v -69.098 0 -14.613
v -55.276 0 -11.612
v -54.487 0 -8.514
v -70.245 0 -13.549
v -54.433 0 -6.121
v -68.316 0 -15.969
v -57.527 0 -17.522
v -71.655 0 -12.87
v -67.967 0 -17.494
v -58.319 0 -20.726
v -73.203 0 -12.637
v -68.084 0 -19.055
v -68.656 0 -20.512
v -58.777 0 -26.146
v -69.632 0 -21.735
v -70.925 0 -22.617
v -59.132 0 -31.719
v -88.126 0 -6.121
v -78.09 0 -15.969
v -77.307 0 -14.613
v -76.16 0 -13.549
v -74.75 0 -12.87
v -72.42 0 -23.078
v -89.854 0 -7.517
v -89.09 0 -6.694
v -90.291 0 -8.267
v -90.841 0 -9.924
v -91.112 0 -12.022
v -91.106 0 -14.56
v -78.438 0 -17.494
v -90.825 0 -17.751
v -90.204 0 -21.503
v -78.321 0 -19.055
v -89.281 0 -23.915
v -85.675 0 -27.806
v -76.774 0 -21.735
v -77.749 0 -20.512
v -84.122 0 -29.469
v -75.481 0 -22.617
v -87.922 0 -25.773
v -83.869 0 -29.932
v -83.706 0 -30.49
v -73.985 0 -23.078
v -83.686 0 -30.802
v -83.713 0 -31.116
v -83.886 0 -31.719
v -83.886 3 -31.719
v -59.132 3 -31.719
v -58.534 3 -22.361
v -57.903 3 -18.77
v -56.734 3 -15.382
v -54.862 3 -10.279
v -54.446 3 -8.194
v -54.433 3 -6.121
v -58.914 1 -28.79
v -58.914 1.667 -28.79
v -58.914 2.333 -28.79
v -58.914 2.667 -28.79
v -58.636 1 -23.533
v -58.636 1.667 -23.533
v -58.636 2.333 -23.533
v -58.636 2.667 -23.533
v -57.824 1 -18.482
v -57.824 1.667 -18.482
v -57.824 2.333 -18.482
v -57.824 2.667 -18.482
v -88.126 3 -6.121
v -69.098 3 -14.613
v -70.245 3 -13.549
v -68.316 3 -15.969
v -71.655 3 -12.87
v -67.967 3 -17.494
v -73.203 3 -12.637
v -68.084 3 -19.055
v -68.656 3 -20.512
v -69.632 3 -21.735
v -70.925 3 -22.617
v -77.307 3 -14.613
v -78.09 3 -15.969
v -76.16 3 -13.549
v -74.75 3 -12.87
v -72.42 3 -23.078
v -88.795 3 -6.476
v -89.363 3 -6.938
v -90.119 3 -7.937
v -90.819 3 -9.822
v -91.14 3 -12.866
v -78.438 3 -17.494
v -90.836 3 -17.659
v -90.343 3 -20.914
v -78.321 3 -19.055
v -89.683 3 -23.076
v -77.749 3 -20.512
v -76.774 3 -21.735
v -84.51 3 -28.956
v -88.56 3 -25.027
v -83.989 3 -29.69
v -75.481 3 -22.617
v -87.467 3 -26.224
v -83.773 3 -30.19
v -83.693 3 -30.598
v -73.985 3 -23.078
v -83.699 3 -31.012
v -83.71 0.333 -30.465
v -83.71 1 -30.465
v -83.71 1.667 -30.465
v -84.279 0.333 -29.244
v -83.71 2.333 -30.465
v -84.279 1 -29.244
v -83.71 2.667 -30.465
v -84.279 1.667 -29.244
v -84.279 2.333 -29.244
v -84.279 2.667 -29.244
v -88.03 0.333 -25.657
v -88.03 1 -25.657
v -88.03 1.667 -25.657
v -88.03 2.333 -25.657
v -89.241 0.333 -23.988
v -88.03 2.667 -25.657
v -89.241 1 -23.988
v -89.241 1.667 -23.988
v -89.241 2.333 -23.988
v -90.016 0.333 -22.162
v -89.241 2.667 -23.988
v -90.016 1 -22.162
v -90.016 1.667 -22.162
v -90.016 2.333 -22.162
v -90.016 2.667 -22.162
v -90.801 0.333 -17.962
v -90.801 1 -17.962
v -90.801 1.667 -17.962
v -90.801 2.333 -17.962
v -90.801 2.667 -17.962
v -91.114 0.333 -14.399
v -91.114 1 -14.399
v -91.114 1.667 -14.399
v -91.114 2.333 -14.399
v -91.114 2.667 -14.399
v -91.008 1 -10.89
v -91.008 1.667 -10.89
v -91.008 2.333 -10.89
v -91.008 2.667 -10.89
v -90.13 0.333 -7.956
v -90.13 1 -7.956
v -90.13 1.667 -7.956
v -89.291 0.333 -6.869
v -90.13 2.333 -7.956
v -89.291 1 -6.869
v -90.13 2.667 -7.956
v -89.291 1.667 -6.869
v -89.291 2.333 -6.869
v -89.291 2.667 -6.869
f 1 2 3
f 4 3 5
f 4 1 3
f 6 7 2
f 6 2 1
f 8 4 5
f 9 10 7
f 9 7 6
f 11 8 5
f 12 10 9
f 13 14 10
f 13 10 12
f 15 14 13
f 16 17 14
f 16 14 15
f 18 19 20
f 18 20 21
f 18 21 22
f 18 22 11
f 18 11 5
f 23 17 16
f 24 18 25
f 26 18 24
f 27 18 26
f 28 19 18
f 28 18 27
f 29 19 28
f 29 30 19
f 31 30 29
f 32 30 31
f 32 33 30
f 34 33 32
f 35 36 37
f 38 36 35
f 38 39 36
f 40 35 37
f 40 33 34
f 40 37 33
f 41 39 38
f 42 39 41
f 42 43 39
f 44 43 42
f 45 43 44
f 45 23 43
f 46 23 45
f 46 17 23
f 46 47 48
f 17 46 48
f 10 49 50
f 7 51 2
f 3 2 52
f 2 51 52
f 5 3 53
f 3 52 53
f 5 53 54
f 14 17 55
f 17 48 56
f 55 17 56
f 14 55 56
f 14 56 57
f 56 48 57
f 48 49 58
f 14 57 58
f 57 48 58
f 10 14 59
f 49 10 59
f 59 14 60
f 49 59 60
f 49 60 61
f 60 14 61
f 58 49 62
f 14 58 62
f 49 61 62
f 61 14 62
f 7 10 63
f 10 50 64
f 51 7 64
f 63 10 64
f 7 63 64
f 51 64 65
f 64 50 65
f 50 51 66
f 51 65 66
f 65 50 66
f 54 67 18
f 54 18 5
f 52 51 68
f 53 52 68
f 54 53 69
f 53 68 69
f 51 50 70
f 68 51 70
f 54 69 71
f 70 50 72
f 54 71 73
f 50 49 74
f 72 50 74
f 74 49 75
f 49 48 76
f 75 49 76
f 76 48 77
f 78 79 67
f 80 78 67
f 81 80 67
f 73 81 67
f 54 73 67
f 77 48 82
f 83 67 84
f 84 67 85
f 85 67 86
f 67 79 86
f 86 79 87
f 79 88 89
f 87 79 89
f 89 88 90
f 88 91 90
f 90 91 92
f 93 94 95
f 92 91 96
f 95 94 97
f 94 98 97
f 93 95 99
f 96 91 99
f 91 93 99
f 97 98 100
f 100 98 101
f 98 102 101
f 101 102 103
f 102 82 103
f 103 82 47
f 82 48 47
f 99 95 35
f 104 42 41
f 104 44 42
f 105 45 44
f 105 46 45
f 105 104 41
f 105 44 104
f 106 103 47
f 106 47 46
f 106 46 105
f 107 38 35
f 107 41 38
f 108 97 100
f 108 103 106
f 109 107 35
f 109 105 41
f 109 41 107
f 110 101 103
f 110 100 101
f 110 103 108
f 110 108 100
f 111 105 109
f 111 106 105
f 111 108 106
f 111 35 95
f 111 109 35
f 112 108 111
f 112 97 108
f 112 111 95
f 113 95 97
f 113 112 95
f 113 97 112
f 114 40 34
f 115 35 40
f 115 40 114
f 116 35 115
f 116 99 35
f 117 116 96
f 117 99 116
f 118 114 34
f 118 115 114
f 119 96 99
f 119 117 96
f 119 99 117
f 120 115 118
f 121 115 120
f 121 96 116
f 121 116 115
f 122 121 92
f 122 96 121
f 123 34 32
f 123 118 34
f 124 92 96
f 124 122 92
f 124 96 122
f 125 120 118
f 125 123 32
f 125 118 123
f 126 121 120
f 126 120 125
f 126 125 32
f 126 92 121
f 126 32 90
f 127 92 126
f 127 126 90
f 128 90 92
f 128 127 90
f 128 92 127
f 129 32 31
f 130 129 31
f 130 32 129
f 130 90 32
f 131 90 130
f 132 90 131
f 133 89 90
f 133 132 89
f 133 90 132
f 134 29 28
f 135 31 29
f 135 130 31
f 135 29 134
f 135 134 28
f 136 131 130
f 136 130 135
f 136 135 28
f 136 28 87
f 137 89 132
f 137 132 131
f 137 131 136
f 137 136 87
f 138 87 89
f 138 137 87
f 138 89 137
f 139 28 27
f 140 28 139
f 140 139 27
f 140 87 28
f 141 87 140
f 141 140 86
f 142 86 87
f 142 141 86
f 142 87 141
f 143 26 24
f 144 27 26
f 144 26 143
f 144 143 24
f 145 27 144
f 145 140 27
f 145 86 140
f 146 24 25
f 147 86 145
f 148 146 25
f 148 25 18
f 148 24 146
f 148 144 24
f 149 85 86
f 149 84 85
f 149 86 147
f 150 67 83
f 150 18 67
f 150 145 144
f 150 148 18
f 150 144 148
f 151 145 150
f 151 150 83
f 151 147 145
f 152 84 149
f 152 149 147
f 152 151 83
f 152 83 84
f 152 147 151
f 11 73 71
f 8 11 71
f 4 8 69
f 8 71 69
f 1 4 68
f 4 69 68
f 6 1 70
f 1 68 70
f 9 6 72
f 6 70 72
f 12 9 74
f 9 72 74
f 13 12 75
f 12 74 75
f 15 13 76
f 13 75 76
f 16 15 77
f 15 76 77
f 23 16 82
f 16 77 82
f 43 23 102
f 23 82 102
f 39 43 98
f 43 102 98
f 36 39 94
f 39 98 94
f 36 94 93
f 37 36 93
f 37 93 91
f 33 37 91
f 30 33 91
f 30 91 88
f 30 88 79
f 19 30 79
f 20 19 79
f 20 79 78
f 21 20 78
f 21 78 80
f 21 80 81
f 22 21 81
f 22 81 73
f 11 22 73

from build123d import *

# Parameters (mm, degrees)
DODANIE_WYCI_GNI_CIE1_DEPTH = 3
SZKIC2_R                    = 5.25
WYTNIJ_WYCI_GNI_CIE1_DEPTH  = 123.478678077
SZKIC3_W                    = 83.042343976
SZKIC3_H                    = 22.425434336
SZKIC3_W_2                  = 92.40199983
SZKIC3_H_2                  = 23.262955651
WYTNIJ_WYCI_GNI_CIE2_DEPTH  = 123.478678077
WYTNIJ_WYCI_GNI_CIE3_DEPTH  = 114.371150202


with BuildPart() as part:
    # Szkic1 → Dodanie-wyciągnięcie1 (new body)
    with BuildSketch(Plane(origin=(0, 0, 0), x_dir=(1, 0, 0), z_dir=(0, 1, 0))):
        with BuildLine():
            Line((-97.678150888, 49.4149367), (-32.744802343, 49.4149367))
            add(Edge.make_bspline(
                [(-32.744802343, 49.4149367), (-29.306315805, 38.482449345), (-35.086079974, 19.443677378), (-46.815707035, -0.452000217), (-49.516641207, -11.467220133), (-49.715376383, -12.36868324)],
                knots=[0.154589074, 0.154589074, 0.154589074, 0.154589074, 0.39168588, 0.61157723, 0.631041789, 0.631041789, 0.631041789, 0.631041789], degree=3))
            Line((-49.715376383, -12.36868324), (-112.027633116, -12.36868324))
            add(Edge.make_bspline(
                [(-97.678150888, 49.4149367), (-95.996907517, 42.817556452), (-98.213660437, 28.328196325), (-109.215623339, 9.191600555), (-111.919105273, -6.718294499), (-112.027633116, -12.36868324)],
                knots=[0.127638687, 0.127638687, 0.127638687, 0.127638687, 0.284871496, 0.500245721, 0.624008673, 0.624008673, 0.624008673, 0.624008673], degree=3))
        make_face()
    extrude(amount=DODANIE_WYCI_GNI_CIE1_DEPTH)

    # Szkic2 → Wytnij-wyciągnięcie1 (cut, through all)
    with BuildSketch(Plane(origin=(0, 3, 0), x_dir=(1, 0, 0), z_dir=(0, 1, 0))):
        with Locations(Location((-73.202778656, 17.886796147, 0), (0, 0, 270))):
            Circle(SZKIC2_R)
    extrude(amount=-WYTNIJ_WYCI_GNI_CIE1_DEPTH, mode=Mode.SUBTRACT)

    # Szkic3 → Wytnij-wyciągnięcie2 (cut, through all)
    with BuildSketch(Plane(origin=(0, 3, 0), x_dir=(1, 0, 0), z_dir=(0, 1, 0))):
        with Locations((-62.244564273, 42.931839176)):
            Rectangle(SZKIC3_W, SZKIC3_H)
        with Locations((-68.037284909, -5.510245727)):
            Rectangle(SZKIC3_W_2, SZKIC3_H_2)
    extrude(amount=-WYTNIJ_WYCI_GNI_CIE2_DEPTH, mode=Mode.SUBTRACT)

    # Szkic4 → Wytnij-wyciągnięcie3 (cut, through all)
    with BuildSketch(Plane(origin=(0, 3, 0), x_dir=(1, 0, 0), z_dir=(0, 1, 0))):
        with BuildLine():
            add(Edge.make_bspline(
                [(-88.689938792, 36.010164682), (-86.071156922, 34.618848613), (-81.089784858, 30.465171833), (-89.644619421, 25.502930729), (-91.094282475, 17.320923853), (-91.890518911, 4.656814481), (-70.345884336, 7.408238477), (-112.625080918, -8.466168712), (-128.254843762, 14.531836441), (-112.47359997, 31.235119166), (-98.588015331, 41.268851209), (-88.689938792, 36.010164682)],
                knots=[0, 0, 0, 0, 0.056310149, 0.105139867, 0.166932459, 0.258637906, 0.305170294, 0.520996128, 0.678649021, 0.787167396, 1, 1, 1, 1], degree=3))
        make_face()
        with BuildLine():
            add(Edge.make_bspline(
                [(-58.506782582, 38.587883821), (-59.676552515, 36.005094764), (-58.575510558, 28.258639934), (-58.925436397, 17.111965112), (-49.705448185, 4.127794868), (-72.040088465, -9.964706752), (-44.500598429, -4.631349285), (-29.373358451, 0.777563949), (-22.973161664, 21.590397636), (-30.322336493, 42.955036515), (-55.380407315, 45.490752157), (-58.506782582, 38.587883821)],
                knots=[0, 0, 0, 0, 0.066886355, 0.137581529, 0.239375905, 0.330501418, 0.448637218, 0.557955025, 0.707331232, 0.821236773, 1, 1, 1, 1], degree=3))
        make_face()
    extrude(amount=-WYTNIJ_WYCI_GNI_CIE3_DEPTH, mode=Mode.SUBTRACT)


solid = part.part
